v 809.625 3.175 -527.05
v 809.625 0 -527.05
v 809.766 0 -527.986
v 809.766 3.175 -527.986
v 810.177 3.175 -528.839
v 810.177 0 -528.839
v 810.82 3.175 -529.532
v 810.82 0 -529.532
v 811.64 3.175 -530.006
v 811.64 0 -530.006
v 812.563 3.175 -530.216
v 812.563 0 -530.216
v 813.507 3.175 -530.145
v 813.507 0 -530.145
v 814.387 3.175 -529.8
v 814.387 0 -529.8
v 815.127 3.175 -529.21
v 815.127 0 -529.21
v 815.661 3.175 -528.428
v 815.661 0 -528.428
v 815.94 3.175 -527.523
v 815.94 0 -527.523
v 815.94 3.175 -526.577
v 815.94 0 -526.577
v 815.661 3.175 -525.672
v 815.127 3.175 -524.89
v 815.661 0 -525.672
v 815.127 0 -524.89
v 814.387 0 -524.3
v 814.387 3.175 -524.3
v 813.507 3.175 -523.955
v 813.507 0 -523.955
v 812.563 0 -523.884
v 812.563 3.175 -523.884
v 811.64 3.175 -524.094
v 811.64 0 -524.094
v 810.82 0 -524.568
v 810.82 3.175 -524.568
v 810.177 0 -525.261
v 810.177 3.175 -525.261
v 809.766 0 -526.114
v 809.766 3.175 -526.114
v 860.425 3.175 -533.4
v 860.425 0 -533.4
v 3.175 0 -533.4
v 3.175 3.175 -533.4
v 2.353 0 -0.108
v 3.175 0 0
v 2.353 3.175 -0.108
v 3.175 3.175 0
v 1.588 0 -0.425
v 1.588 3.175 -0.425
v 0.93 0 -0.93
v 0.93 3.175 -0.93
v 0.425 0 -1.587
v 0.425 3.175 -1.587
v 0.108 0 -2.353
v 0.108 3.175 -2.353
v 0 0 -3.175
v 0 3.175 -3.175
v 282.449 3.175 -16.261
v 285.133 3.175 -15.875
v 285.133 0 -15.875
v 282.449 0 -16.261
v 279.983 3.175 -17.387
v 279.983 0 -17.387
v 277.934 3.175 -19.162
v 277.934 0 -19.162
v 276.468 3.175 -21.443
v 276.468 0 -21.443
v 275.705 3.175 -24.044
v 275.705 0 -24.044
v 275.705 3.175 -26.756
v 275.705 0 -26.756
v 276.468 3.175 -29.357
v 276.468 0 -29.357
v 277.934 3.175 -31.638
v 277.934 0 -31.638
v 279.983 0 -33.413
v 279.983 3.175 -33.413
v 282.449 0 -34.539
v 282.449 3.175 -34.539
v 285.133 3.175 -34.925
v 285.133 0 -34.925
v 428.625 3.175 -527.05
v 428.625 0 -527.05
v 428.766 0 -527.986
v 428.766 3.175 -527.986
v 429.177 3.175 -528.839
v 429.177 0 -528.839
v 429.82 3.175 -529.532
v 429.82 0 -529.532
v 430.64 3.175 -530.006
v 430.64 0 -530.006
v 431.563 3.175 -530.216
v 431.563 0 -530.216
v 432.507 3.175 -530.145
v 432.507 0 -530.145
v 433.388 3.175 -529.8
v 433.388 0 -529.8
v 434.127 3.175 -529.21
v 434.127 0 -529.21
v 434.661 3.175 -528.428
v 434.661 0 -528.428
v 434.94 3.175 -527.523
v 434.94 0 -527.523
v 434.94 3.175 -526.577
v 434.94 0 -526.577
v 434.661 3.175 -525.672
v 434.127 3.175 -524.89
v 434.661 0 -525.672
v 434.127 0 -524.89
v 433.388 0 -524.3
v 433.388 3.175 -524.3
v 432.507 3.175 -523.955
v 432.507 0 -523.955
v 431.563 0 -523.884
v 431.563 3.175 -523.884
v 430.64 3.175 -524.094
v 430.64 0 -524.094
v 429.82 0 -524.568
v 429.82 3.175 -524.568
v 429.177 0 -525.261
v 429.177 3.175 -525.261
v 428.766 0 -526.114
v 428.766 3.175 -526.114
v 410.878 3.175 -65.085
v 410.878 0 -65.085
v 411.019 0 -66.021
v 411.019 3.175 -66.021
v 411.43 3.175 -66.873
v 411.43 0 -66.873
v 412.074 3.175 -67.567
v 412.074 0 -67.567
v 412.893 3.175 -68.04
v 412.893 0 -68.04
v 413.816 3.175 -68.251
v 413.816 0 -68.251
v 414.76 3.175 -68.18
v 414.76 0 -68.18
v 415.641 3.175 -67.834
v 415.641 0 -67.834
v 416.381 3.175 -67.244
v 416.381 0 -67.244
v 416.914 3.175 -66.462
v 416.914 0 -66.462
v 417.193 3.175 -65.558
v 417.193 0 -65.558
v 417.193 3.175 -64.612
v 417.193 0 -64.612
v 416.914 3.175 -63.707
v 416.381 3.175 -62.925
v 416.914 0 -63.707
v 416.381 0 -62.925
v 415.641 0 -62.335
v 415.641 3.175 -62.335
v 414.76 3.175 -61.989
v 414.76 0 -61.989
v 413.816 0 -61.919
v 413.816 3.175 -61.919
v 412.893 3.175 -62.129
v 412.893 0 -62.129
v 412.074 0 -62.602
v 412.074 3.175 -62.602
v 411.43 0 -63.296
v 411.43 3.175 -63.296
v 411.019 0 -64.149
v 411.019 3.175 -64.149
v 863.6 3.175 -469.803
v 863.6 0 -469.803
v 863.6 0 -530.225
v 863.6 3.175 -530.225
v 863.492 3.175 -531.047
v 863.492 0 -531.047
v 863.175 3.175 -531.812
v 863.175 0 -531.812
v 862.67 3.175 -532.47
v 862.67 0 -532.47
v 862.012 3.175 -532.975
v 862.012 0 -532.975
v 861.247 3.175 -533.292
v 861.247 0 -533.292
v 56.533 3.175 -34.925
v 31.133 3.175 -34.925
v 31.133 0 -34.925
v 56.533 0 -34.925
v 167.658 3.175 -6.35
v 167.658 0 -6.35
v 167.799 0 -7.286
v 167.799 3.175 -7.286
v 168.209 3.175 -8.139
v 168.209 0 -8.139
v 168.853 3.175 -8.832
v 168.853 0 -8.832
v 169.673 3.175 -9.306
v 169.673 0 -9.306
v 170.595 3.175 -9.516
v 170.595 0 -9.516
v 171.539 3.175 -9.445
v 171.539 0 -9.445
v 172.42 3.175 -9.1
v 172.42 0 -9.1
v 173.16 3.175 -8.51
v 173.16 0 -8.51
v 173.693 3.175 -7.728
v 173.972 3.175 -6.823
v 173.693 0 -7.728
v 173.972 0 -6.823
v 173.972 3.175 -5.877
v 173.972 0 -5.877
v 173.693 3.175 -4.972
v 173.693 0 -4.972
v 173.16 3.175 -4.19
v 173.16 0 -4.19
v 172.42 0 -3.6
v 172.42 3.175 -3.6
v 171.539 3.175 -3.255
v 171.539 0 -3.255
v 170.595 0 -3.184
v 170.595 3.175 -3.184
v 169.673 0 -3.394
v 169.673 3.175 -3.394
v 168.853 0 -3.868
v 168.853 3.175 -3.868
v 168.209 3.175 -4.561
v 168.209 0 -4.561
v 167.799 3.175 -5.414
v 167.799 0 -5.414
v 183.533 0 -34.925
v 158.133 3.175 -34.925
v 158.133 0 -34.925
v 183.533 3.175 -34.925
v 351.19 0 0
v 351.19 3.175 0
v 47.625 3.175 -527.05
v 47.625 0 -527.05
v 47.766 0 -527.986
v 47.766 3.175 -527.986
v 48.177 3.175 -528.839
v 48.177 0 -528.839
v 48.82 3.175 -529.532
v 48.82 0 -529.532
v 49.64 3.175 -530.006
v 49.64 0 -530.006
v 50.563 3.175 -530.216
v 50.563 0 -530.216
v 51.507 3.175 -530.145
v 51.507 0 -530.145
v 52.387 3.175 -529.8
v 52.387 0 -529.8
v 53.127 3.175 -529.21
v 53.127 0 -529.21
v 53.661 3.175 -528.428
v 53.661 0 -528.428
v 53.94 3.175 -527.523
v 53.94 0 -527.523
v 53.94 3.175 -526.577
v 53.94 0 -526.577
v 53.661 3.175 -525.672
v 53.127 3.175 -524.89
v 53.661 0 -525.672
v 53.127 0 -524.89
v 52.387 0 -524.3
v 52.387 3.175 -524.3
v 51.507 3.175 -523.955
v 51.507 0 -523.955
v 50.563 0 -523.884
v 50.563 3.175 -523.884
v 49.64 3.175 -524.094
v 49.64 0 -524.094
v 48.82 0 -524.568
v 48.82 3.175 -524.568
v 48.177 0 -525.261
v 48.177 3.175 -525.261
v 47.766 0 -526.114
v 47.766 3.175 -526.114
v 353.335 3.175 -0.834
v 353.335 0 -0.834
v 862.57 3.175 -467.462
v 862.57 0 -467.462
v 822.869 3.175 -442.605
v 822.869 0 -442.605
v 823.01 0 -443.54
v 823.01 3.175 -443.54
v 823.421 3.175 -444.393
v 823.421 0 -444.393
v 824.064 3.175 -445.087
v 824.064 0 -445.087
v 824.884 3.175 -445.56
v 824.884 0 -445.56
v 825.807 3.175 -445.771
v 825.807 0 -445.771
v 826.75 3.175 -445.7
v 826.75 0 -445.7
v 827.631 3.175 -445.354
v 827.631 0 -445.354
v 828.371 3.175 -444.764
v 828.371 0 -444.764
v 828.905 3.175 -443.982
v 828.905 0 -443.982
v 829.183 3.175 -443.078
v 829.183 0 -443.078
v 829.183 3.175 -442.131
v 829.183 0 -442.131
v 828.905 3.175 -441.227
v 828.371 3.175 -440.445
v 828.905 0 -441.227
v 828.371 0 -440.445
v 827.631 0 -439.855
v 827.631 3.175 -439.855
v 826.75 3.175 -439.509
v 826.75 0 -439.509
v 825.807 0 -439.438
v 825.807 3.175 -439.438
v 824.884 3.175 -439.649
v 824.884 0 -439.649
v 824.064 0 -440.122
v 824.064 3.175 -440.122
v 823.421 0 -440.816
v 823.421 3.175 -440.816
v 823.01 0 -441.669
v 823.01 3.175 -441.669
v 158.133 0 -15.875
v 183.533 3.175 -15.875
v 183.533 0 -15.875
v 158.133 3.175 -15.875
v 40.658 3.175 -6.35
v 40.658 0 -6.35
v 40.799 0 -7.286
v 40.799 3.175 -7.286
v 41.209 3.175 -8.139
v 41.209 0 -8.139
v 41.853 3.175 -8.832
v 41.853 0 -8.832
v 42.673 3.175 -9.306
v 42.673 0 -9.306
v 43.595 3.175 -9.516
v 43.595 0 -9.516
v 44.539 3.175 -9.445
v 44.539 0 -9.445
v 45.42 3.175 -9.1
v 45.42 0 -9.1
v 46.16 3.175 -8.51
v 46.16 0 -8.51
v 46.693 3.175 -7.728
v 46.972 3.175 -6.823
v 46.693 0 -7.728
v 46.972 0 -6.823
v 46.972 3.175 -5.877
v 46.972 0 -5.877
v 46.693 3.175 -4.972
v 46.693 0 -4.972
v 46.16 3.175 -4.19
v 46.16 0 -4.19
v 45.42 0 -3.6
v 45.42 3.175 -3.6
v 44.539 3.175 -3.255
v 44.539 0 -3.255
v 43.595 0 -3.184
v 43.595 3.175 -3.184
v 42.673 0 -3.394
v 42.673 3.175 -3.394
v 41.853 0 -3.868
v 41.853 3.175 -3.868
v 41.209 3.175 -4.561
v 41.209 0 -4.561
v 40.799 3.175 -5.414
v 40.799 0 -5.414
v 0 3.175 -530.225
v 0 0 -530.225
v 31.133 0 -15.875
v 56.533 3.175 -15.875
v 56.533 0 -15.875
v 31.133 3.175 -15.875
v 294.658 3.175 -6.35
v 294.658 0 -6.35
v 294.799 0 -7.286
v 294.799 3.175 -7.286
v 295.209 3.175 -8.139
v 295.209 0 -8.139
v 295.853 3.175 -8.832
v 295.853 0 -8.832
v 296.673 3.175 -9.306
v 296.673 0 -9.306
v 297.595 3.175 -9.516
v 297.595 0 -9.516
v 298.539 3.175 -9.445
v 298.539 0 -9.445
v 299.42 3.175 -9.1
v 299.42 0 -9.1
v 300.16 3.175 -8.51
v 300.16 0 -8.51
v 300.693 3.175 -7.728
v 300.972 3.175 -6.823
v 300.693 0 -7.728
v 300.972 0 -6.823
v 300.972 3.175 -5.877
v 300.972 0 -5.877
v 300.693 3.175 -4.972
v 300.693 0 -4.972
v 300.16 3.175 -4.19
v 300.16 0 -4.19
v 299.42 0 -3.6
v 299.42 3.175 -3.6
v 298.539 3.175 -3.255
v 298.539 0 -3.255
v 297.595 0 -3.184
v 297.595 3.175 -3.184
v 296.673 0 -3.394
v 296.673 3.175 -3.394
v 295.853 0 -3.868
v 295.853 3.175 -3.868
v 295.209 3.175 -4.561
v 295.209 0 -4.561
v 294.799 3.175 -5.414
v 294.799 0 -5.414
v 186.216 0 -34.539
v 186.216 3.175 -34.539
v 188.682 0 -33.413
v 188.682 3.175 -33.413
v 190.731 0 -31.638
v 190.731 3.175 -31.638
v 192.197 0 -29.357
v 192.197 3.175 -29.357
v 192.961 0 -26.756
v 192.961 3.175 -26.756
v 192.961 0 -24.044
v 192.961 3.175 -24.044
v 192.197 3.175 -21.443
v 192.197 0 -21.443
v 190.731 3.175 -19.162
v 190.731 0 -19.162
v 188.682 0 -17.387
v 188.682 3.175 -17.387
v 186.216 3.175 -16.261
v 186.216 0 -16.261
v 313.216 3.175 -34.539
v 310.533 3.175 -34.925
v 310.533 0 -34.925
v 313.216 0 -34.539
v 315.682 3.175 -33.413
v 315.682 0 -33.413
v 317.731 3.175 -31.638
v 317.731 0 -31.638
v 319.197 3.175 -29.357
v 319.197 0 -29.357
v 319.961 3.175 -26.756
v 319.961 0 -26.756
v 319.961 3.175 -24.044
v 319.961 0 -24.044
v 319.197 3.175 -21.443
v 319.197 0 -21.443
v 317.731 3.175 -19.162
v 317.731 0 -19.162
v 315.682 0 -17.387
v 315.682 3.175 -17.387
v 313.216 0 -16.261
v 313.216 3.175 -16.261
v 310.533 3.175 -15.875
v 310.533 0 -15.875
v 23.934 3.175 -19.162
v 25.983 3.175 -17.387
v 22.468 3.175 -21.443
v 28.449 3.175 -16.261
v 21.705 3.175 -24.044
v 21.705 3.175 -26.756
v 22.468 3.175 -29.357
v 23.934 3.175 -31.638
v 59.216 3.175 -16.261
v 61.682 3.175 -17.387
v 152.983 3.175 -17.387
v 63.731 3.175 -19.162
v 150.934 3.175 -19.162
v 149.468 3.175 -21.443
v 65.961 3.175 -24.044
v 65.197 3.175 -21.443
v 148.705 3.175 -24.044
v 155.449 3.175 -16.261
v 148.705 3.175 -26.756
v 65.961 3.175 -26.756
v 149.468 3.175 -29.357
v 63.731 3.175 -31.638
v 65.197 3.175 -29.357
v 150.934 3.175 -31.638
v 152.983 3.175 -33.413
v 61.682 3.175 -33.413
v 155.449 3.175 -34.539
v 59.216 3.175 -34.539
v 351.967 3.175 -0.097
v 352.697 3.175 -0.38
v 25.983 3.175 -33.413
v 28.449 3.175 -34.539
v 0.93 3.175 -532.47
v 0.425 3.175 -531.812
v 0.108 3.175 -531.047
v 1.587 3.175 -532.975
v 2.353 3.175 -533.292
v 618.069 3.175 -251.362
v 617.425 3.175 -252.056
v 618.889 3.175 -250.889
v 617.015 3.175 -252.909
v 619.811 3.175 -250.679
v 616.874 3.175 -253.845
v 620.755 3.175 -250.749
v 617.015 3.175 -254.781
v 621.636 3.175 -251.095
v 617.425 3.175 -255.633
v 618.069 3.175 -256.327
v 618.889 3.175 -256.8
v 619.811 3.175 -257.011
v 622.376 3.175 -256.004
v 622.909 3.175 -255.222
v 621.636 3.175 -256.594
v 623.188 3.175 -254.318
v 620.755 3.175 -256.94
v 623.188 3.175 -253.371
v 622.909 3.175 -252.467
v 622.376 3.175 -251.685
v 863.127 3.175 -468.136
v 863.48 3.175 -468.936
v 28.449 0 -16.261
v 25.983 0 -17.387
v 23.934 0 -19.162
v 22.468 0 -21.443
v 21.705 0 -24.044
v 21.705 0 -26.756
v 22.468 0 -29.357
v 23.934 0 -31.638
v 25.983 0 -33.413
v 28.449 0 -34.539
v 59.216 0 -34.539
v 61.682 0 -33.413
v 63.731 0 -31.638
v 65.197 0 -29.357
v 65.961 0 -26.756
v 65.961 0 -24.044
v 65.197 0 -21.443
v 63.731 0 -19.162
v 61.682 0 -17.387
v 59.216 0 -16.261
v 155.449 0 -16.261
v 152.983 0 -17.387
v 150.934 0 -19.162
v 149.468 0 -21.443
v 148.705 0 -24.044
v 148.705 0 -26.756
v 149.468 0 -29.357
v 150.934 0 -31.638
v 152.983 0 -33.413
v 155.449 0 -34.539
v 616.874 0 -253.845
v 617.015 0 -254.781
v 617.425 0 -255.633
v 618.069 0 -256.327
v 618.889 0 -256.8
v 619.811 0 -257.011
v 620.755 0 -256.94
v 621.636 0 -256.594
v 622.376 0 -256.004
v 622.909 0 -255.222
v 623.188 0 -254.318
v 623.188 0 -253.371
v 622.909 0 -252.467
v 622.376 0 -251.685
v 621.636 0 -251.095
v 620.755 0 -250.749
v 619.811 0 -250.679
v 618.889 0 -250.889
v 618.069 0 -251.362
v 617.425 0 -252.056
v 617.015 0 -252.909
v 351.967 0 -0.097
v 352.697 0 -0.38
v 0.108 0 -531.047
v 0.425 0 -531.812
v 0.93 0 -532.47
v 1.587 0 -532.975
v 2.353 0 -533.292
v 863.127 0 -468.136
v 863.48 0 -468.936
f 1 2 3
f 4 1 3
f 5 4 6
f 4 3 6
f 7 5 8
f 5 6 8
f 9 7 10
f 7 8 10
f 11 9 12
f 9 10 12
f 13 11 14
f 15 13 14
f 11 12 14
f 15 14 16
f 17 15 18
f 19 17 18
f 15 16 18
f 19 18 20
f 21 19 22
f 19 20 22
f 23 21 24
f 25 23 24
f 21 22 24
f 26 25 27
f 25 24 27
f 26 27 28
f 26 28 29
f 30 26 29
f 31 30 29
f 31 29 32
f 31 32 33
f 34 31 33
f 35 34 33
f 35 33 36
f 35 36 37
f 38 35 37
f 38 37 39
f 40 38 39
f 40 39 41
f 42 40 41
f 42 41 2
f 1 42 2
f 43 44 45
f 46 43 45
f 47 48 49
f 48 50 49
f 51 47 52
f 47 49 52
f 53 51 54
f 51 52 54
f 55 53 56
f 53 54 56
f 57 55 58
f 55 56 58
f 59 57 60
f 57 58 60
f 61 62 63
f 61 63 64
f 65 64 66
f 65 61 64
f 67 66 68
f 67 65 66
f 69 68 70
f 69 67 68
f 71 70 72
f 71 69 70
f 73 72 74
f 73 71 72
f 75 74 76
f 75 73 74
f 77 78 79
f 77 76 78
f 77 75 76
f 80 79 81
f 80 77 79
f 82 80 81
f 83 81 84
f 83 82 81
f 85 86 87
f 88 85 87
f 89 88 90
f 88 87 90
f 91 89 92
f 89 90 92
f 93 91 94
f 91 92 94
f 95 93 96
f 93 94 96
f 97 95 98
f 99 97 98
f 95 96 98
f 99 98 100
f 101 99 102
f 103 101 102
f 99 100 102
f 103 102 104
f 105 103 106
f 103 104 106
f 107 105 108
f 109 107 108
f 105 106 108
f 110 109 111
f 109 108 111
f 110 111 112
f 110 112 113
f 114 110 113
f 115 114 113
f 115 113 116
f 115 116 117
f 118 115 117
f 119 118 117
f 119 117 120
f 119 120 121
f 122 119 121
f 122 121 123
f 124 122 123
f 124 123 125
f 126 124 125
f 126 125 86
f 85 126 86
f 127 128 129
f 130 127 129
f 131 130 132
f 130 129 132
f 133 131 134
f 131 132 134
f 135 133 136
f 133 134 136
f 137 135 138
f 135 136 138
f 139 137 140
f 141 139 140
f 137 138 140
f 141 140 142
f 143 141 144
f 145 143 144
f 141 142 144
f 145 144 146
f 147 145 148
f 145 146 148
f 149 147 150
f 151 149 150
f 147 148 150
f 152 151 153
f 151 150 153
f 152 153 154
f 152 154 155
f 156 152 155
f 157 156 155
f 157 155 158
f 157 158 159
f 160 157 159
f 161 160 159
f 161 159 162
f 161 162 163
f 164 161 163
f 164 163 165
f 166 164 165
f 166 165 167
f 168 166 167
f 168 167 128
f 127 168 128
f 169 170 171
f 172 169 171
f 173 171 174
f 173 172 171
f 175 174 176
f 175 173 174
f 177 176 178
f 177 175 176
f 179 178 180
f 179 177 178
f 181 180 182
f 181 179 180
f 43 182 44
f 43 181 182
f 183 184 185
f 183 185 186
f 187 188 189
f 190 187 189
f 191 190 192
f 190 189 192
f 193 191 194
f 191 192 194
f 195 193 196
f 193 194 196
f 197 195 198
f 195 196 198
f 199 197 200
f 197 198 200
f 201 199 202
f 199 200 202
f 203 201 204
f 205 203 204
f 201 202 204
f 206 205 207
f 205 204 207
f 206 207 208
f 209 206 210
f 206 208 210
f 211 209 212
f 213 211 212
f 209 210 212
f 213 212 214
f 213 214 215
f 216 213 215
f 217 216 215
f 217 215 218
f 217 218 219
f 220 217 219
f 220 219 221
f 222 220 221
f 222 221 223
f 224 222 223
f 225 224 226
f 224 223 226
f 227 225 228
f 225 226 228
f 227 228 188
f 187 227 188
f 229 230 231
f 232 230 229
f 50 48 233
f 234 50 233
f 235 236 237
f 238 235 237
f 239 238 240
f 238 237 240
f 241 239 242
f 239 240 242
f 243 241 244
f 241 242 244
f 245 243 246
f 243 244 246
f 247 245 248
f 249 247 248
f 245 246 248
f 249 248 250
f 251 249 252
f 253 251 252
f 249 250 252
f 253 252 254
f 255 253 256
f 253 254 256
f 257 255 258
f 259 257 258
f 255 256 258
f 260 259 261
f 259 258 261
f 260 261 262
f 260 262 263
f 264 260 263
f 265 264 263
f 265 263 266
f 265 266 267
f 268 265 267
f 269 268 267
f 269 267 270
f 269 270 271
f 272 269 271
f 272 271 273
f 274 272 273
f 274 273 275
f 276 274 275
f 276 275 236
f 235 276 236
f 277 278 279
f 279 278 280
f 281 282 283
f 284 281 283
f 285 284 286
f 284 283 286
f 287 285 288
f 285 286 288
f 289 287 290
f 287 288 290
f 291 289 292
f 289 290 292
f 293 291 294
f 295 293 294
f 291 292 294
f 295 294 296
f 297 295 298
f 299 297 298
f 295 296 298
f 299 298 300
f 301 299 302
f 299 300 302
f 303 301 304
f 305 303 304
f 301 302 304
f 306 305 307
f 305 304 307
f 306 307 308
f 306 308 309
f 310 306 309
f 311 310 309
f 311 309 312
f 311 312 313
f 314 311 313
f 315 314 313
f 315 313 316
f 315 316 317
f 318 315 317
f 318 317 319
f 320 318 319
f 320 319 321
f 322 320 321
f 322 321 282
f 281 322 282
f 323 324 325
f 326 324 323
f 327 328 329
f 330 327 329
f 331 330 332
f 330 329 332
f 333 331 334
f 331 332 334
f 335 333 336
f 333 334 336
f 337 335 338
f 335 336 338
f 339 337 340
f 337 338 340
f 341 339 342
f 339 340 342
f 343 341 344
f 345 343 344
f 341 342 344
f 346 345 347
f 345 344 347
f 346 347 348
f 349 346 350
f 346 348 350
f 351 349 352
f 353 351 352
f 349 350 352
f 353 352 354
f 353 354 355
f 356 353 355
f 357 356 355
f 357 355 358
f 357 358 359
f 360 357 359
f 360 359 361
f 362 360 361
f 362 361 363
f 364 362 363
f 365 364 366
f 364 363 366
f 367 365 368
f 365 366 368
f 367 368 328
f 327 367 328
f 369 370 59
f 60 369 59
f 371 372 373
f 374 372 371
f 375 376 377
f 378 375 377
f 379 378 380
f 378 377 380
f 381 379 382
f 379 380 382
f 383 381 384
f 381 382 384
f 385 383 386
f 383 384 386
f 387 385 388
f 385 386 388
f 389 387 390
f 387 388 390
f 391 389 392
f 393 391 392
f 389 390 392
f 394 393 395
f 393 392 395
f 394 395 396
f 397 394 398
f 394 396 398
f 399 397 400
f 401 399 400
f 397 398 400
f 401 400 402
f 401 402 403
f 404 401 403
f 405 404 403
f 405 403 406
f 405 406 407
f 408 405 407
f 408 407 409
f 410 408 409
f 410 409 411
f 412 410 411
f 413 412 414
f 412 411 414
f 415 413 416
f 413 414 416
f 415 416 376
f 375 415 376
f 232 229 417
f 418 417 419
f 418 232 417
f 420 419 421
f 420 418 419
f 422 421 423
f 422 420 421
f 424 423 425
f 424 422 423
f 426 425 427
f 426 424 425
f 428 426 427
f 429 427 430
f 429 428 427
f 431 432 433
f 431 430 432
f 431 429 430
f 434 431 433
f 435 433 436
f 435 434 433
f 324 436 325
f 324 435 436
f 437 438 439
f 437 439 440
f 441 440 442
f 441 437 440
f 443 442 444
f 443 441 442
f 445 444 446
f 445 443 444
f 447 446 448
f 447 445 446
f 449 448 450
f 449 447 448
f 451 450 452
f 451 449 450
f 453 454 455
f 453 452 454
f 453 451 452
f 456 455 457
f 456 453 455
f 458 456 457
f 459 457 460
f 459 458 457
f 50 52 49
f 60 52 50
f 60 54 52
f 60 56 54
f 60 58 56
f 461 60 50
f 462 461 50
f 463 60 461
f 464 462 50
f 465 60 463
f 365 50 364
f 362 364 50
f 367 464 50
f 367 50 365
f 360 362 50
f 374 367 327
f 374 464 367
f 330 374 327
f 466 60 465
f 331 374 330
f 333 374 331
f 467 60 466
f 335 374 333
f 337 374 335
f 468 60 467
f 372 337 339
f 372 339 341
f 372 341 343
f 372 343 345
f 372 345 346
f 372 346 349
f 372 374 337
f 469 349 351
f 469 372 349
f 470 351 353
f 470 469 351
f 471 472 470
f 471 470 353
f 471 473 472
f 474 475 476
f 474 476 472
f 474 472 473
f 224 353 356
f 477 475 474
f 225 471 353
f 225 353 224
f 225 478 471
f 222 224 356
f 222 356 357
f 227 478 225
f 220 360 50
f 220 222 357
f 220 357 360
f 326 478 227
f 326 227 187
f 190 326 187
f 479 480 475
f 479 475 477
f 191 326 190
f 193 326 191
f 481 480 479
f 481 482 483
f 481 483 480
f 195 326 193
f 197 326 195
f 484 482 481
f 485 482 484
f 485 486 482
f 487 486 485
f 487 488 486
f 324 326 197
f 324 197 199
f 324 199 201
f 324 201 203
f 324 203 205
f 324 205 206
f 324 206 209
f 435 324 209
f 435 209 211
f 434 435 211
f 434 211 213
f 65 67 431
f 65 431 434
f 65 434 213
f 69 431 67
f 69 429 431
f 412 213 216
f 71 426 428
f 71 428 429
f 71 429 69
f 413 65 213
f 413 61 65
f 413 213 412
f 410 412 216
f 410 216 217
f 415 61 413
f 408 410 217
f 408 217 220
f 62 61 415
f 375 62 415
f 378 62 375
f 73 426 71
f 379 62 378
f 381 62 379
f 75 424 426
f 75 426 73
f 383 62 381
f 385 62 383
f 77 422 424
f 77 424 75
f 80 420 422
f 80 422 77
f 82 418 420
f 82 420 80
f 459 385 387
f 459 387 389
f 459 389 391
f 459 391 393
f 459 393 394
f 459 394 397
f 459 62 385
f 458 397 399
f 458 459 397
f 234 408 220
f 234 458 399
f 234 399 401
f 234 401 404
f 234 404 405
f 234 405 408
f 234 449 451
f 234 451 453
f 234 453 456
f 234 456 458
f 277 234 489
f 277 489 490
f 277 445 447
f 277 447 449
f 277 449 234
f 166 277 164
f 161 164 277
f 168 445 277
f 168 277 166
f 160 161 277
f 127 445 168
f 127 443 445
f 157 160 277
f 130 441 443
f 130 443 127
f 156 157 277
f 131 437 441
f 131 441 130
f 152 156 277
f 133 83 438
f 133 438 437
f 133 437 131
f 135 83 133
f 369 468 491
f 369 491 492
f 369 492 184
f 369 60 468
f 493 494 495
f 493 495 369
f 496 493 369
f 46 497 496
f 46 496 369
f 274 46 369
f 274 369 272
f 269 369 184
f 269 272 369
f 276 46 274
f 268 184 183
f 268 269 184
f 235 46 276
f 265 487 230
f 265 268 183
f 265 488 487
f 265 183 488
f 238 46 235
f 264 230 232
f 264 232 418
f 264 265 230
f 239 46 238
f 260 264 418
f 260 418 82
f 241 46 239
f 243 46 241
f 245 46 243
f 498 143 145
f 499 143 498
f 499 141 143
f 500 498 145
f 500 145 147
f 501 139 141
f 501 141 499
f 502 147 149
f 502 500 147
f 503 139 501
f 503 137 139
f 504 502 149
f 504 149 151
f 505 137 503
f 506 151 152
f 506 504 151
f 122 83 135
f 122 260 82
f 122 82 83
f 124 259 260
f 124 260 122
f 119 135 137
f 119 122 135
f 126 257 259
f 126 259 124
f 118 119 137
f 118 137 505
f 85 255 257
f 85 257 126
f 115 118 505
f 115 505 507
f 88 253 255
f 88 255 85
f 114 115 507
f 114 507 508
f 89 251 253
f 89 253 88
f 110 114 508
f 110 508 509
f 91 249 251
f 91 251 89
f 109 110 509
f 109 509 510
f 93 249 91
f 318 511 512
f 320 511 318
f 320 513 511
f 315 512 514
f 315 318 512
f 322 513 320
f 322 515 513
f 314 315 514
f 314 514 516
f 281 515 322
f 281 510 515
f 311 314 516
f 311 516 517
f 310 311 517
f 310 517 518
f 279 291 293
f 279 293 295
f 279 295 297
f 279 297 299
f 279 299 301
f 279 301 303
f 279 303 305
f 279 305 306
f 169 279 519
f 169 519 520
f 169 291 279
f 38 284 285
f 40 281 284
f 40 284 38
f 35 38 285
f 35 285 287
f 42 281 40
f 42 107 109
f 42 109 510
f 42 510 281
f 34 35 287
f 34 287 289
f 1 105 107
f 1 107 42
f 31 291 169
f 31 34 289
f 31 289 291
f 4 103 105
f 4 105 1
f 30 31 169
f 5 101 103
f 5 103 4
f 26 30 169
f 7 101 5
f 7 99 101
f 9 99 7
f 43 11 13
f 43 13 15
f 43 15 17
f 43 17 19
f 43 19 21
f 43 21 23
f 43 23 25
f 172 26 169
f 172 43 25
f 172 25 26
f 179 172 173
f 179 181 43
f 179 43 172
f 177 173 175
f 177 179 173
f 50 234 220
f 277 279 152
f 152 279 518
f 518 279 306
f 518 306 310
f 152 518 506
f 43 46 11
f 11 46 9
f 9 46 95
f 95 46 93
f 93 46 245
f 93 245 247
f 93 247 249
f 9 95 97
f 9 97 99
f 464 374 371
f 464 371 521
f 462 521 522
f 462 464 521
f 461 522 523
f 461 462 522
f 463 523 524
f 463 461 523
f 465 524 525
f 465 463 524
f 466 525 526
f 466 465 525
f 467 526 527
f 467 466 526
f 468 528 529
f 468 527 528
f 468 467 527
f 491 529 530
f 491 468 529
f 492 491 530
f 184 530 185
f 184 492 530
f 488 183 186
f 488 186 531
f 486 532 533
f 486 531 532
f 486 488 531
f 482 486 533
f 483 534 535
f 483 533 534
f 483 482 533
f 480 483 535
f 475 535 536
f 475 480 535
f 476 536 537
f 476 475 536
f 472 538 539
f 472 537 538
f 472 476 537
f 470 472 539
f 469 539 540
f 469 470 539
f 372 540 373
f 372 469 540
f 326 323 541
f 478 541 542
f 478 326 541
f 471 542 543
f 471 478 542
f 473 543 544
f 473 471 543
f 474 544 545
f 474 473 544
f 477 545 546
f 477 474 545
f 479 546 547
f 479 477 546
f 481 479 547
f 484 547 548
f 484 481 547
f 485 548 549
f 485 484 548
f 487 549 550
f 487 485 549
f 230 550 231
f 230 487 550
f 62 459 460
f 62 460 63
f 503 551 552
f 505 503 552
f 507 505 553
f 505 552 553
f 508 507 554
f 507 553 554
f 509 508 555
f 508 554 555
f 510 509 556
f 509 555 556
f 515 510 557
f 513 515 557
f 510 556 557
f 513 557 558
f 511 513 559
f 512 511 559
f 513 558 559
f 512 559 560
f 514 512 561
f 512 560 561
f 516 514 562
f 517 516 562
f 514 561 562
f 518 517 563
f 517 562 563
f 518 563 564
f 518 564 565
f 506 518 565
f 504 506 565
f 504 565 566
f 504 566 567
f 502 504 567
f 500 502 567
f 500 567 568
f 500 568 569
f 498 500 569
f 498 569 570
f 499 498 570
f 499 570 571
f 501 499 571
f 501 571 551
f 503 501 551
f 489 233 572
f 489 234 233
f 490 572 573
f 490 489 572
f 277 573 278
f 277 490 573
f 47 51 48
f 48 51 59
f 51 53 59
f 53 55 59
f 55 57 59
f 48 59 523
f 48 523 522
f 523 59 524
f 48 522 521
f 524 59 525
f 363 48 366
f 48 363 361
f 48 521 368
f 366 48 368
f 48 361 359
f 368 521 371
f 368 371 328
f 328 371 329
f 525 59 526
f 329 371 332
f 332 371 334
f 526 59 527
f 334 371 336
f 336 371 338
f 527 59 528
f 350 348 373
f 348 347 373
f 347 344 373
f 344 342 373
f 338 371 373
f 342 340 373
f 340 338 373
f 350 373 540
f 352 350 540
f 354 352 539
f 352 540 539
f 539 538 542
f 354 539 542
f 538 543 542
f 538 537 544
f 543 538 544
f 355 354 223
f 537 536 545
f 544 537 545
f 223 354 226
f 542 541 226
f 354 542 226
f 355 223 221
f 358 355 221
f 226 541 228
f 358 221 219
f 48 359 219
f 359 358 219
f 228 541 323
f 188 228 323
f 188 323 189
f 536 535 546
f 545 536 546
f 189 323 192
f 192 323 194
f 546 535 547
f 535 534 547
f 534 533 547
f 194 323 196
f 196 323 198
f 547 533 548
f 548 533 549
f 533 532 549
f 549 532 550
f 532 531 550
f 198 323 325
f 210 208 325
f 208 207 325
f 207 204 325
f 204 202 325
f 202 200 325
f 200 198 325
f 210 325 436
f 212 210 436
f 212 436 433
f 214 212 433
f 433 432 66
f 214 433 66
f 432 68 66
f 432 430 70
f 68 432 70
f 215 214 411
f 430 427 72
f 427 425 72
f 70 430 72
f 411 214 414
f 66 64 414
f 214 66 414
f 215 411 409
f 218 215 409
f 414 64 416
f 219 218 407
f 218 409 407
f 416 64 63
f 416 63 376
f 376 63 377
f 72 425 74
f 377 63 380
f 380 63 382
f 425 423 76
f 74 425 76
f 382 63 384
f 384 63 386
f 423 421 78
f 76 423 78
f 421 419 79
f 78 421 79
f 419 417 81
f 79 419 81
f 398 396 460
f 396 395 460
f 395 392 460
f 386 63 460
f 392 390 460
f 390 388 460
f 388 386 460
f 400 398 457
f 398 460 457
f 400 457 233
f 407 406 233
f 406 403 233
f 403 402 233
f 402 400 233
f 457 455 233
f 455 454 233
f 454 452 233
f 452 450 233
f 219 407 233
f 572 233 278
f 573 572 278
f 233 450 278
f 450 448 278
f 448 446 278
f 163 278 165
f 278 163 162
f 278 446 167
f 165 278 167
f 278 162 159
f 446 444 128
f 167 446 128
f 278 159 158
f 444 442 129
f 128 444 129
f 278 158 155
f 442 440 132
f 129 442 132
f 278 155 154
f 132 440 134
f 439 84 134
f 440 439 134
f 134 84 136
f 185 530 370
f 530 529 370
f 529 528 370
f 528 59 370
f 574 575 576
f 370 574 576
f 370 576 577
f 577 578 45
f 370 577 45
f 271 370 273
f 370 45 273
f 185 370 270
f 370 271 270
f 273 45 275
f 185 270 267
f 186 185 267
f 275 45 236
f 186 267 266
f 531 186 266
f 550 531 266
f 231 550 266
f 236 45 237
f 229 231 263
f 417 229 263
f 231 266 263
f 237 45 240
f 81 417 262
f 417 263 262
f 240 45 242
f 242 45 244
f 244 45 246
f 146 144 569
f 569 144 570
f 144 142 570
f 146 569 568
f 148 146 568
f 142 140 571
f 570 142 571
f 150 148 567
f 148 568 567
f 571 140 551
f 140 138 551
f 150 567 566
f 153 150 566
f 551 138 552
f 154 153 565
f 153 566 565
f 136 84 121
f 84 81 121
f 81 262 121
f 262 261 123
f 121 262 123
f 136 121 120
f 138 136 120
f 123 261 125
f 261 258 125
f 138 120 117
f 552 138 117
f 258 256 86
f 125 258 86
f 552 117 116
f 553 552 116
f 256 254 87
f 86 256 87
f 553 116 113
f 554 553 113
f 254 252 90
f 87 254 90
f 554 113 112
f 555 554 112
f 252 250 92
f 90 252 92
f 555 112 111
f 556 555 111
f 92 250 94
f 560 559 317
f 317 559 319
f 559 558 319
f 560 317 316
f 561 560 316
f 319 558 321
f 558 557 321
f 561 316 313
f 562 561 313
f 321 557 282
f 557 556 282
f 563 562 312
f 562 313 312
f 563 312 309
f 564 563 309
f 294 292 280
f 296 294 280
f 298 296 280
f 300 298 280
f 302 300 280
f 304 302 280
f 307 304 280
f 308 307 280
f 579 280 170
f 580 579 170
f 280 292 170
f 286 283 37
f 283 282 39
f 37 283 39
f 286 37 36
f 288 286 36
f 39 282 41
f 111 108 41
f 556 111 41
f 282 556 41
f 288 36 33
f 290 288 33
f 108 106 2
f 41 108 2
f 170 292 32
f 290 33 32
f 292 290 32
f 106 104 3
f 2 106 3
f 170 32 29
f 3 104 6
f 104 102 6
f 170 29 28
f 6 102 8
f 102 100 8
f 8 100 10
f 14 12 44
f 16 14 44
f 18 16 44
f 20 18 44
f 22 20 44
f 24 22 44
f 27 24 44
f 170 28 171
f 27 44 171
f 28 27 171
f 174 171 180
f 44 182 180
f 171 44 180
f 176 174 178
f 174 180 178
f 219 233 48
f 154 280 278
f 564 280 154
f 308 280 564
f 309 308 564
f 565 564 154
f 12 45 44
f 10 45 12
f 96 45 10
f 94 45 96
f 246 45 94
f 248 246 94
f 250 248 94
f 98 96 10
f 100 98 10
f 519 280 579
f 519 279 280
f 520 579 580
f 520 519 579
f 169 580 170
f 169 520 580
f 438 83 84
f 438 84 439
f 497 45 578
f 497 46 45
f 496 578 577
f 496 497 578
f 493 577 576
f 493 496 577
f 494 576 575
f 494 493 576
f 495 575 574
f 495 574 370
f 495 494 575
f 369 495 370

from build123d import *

# Parameters (mm, degrees)
BOSS_EXTRUDE1_DEPTH         = 3.175
FILLET1_R                   = 3.175
F_1_4_0_25_DIAMETER_HOLE1_D = 6.35
SKETCH5_R                   = 3.175
CUT_EXTRUDE1_DEPTH          = 1016.052018679


with BuildPart() as part:
    # Sketch1 → Boss-Extrude1 (new body)
    with BuildSketch(Plane(origin=(0, 0, 0), x_dir=(1, 0, 0), z_dir=(0, 1, 0))):
        Polygon((0, 0), (352.425, 0), (863.6, 468.405587878), (863.6, 533.4), (0, 533.4), align=None)
    extrude(amount=BOSS_EXTRUDE1_DEPTH)

    # Fillet1
    fillet1_edges = [part.edges().sort_by_distance(p)[0] for p in [
        (0, 1.5875, -533.4),
        (863.6, 1.5875, -533.4),
        (863.6, 1.5875, -468.405587878),
        (352.425, 1.5875, 0),
        (0, 1.5875, 0),
    ]]
    fillet(fillet1_edges, radius=FILLET1_R)

    # 1/4 (0.25) Diameter Hole1 (through all)
    with Locations(Plane(origin=(0, 3.175, 0), x_dir=(1, 0, 0), z_dir=(0, 1, 0))):
        with Locations((43.832655013, 6.35), (170.832655013, 6.35), (297.832655013, 6.35), (414.05335701, 65.084754558), (620.048644915, 253.844658566), (826.043932819, 442.604562573), (50.8, 527.05), (431.8, 527.05), (812.8, 527.05)):
            Hole(F_1_4_0_25_DIAMETER_HOLE1_D / 2)

    # Sketch5 → Cut-Extrude1 (cut, through all)
    with BuildSketch(Plane(origin=(0, 3.175, 0), x_dir=(1, 0, 0), z_dir=(0, 1, 0))):
        with Locations(Location((297.832655013, 6.35, 0), (0, 0, 270))):
            Circle(SKETCH5_R)
        with Locations(Location((170.832655013, 6.35, 0), (0, 0, 270))):
            Circle(SKETCH5_R)
        with Locations(Location((43.832655013, 6.35, 0), (0, 0, 270))):
            Circle(SKETCH5_R)
        with BuildLine():
            Line((31.132655013, 34.925), (56.532655013, 34.925))
            ThreePointArc((56.532655013, 34.925), (66.057655013, 25.4), (56.532655013, 15.875))
            Line((56.532655013, 15.875), (31.132655013, 15.875))
            ThreePointArc((31.132655013, 15.875), (21.607655013, 25.4), (31.132655013, 34.925))
        make_face()
        with BuildLine():
            Line((158.132655013, 34.925), (183.532655013, 34.925))
            ThreePointArc((183.532655013, 34.925), (193.057655013, 25.4), (183.532655013, 15.875))
            Line((183.532655013, 15.875), (158.132655013, 15.875))
            ThreePointArc((158.132655013, 15.875), (148.607655013, 25.4), (158.132655013, 34.925))
        make_face()
        with BuildLine():
            Line((285.132655013, 34.925), (310.532655013, 34.925))
            ThreePointArc((310.532655013, 34.925), (320.057655013, 25.4), (310.532655013, 15.875))
            Line((310.532655013, 15.875), (285.132655013, 15.875))
            ThreePointArc((285.132655013, 15.875), (275.607655013, 25.4), (285.132655013, 34.925))
        make_face()
    extrude(amount=-CUT_EXTRUDE1_DEPTH, mode=Mode.SUBTRACT)


solid = part.part
